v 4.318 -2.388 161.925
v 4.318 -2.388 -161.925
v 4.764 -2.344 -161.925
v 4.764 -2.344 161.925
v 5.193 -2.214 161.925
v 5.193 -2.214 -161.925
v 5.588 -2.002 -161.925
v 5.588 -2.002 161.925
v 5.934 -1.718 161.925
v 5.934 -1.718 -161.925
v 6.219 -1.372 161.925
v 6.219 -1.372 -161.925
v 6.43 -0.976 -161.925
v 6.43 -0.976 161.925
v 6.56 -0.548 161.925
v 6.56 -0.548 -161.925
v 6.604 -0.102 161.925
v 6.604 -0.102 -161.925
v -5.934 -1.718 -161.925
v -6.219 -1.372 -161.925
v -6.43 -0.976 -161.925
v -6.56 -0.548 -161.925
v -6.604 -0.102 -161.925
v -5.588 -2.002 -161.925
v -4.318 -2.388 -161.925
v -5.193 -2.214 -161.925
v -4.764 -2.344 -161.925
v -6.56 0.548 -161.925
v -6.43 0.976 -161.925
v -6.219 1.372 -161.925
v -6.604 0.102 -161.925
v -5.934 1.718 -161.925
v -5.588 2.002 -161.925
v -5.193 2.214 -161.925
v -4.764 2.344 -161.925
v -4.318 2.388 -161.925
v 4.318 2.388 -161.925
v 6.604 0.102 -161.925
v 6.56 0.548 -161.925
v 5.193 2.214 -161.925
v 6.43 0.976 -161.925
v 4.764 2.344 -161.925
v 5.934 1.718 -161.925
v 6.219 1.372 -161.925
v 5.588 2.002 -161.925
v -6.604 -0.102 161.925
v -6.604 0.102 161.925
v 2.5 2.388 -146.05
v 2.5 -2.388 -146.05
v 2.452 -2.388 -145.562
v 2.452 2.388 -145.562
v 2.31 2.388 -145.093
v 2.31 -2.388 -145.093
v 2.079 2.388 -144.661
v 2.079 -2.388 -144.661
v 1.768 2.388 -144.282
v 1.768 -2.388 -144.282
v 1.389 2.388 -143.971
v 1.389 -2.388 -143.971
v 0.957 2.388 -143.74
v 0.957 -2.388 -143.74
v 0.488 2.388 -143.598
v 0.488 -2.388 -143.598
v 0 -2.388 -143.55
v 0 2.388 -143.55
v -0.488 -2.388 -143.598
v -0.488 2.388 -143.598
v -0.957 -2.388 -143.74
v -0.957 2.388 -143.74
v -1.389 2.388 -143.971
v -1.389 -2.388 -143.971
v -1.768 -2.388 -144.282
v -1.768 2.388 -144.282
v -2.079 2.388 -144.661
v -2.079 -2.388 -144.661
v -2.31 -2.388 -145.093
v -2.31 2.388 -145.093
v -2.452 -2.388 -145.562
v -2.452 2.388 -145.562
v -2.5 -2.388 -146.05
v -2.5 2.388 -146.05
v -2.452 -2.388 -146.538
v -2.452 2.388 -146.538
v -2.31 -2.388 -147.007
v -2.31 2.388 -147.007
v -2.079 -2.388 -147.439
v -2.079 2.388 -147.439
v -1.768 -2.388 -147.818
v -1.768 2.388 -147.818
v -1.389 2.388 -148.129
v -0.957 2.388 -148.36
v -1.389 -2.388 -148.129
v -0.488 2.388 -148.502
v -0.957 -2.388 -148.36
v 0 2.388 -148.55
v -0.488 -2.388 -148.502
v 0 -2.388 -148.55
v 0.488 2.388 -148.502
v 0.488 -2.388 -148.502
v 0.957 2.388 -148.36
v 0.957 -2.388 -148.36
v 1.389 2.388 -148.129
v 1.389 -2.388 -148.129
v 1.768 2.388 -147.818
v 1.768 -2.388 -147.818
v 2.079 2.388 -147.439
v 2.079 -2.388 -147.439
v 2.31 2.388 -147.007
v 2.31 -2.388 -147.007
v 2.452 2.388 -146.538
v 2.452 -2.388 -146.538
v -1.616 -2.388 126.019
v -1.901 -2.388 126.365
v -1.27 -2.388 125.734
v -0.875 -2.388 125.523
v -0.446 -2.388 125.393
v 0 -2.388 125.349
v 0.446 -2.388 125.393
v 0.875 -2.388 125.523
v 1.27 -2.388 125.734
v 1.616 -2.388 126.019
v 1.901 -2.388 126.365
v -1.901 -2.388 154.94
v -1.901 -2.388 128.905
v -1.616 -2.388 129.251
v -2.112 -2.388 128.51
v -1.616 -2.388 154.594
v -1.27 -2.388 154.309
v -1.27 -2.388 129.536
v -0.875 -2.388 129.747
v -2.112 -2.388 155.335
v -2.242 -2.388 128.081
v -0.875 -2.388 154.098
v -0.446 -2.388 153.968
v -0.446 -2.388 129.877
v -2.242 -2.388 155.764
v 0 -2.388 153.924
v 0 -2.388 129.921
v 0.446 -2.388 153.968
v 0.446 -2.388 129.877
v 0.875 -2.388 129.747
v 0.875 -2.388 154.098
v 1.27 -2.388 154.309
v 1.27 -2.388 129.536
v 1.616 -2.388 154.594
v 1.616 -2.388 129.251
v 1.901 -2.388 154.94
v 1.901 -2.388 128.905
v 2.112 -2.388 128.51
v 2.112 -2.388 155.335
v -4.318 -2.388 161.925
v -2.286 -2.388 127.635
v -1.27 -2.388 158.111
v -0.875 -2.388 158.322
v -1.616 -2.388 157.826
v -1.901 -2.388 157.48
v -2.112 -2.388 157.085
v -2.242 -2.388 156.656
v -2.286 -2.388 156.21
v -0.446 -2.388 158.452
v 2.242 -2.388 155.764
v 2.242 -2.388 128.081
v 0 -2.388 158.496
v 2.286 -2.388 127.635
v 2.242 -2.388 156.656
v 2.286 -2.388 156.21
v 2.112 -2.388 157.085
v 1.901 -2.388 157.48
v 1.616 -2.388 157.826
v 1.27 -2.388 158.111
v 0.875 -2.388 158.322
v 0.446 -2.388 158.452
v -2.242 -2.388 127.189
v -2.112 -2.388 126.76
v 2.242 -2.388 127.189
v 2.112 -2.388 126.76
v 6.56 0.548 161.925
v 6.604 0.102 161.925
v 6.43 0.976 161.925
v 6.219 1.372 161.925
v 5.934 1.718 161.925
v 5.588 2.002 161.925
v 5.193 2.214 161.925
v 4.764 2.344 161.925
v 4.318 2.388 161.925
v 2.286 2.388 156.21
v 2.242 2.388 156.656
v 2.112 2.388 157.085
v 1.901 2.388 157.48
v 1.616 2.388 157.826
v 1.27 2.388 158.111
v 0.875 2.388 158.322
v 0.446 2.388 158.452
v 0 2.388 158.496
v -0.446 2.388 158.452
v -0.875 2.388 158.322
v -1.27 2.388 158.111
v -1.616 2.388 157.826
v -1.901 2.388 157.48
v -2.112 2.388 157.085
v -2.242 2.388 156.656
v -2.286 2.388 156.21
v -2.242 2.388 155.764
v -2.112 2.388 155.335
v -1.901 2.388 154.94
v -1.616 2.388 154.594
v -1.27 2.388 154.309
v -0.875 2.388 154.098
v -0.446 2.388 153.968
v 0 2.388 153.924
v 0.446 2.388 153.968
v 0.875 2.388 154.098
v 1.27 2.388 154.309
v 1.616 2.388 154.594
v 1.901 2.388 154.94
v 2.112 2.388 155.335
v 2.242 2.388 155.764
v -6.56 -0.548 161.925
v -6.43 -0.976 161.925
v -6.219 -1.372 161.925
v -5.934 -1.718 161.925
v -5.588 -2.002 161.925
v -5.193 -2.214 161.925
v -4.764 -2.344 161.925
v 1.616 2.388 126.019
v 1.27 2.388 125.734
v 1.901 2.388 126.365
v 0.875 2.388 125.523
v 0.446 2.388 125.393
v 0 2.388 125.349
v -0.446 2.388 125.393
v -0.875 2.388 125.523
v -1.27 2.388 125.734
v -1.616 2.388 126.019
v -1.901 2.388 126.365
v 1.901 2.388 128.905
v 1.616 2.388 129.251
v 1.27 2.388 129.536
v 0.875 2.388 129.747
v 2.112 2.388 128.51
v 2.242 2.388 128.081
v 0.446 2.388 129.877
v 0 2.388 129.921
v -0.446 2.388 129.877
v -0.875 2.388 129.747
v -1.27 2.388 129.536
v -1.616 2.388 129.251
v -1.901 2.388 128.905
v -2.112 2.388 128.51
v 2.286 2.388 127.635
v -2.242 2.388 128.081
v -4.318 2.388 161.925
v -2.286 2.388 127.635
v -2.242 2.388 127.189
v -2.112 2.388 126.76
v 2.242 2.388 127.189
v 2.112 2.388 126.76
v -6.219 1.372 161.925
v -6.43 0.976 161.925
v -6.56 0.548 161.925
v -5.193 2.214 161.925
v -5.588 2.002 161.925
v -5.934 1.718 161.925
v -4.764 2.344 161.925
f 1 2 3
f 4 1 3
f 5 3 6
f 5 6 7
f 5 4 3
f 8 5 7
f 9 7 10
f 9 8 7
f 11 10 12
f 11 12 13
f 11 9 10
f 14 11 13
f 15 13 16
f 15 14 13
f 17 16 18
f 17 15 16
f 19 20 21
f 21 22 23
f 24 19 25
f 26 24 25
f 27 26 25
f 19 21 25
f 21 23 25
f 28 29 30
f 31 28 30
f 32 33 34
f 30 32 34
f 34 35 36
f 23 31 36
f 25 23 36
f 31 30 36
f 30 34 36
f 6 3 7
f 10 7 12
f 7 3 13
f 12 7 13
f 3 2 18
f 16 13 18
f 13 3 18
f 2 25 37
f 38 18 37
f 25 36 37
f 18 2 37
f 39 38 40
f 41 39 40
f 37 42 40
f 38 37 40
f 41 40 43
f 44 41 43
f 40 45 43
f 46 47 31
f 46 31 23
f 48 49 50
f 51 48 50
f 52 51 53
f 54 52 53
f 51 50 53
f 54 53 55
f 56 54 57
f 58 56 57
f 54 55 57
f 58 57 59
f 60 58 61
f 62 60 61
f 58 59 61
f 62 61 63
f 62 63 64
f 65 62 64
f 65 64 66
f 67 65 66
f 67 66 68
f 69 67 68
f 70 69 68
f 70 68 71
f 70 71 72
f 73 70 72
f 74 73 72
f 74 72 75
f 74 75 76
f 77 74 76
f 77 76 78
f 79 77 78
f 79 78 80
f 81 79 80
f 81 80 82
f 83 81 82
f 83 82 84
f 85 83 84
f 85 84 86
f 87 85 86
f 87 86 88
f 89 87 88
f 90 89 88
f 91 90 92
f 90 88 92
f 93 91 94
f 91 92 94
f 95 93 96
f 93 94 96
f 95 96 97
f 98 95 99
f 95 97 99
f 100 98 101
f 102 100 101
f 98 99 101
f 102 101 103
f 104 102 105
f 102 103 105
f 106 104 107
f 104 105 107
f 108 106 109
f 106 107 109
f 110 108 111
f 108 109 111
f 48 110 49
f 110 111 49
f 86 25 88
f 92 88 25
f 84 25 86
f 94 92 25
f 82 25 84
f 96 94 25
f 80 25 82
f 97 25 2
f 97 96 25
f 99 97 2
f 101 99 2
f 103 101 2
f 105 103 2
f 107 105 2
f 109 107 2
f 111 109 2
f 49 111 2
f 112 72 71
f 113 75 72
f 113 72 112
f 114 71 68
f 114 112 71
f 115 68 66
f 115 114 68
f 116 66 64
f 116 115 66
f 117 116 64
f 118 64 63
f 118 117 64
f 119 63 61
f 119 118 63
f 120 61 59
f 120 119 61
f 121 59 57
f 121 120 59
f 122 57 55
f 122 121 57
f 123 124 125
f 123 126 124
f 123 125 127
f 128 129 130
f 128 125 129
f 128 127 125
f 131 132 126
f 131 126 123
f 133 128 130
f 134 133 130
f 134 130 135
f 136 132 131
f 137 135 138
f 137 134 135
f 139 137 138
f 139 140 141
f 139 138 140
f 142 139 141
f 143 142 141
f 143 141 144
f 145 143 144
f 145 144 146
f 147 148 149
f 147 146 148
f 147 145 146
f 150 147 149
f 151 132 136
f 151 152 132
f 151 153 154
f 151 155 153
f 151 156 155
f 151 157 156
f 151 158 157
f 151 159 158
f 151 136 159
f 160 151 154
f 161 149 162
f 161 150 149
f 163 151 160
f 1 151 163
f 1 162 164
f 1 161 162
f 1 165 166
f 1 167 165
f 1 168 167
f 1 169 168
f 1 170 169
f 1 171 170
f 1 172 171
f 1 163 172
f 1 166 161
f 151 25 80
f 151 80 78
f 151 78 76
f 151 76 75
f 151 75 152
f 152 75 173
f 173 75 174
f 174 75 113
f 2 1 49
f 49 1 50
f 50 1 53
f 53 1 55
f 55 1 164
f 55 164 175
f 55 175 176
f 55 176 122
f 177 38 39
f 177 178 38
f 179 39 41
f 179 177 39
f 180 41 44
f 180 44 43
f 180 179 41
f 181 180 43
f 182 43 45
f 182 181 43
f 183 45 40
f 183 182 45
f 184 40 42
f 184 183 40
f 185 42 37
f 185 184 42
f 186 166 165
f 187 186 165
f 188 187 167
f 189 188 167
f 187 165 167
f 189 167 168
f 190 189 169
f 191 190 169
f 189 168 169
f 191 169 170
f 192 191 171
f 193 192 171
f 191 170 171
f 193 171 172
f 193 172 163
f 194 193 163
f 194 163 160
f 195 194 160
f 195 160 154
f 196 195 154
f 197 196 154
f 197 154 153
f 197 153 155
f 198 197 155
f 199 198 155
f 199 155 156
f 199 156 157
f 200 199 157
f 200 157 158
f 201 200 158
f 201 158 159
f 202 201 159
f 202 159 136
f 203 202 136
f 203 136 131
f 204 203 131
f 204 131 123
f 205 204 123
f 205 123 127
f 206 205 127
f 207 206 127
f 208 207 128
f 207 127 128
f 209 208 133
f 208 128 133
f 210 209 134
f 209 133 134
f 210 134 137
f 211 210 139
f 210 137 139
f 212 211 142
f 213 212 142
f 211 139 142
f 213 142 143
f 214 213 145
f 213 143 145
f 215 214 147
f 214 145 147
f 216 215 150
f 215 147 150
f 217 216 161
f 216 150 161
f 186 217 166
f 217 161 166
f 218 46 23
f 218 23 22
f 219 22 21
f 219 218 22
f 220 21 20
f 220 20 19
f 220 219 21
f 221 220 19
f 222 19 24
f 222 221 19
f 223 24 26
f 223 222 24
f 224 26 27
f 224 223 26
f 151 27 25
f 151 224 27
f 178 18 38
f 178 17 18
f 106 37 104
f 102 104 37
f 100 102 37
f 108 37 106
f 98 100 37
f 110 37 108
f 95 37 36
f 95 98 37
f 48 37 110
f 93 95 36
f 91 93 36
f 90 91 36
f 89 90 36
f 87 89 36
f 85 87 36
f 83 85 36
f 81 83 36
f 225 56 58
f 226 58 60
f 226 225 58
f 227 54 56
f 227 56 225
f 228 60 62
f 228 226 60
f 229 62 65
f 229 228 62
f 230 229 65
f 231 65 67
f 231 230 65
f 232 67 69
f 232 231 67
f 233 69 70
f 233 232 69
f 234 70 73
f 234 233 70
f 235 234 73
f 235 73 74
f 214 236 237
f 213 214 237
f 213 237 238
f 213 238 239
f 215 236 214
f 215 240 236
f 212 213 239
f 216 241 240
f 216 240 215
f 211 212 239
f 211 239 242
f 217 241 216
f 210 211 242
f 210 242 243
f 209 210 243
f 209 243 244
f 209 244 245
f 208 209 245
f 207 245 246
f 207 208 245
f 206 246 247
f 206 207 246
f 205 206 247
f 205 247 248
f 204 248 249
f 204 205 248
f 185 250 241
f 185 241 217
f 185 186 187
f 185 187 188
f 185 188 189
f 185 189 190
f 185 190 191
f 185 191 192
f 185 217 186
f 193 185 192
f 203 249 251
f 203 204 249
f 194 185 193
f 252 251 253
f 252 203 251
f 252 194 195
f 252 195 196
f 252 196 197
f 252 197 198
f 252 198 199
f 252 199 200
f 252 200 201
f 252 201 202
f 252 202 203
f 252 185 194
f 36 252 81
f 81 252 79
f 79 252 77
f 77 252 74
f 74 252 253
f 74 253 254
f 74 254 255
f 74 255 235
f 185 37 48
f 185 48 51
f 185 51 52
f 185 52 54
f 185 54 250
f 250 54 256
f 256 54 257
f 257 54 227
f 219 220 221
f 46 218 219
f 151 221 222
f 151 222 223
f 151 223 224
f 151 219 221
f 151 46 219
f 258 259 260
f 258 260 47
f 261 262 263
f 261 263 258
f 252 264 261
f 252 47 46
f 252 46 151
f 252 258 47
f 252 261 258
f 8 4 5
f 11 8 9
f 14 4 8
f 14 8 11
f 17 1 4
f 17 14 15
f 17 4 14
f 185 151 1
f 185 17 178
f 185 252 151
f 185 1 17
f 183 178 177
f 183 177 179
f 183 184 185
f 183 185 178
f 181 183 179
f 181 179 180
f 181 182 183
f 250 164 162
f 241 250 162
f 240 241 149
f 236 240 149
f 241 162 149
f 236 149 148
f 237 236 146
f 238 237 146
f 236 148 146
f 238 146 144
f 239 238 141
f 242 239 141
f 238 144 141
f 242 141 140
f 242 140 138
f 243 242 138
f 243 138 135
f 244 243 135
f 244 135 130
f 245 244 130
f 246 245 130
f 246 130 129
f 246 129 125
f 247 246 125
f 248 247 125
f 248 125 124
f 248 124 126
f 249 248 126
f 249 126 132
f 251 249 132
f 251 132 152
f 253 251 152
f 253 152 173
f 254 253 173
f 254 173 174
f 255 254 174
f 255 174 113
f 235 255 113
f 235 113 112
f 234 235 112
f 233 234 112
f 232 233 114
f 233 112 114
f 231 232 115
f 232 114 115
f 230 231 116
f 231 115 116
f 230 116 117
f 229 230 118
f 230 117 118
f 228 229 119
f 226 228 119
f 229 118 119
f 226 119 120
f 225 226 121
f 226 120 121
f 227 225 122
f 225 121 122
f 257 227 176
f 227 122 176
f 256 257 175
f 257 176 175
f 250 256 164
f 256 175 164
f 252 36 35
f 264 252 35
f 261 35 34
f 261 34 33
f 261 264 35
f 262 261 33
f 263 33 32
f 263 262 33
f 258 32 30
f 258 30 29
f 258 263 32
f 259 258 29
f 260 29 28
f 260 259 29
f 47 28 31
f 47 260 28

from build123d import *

# Parameters (mm, degrees)
F1_DEPTH = 161.925
F2_R     = 2.286
F3_DEPTH = 25.4
F4_R     = 2.5
F5_DEPTH = 25.4


with BuildPart() as f1:
    # F0 (on Top) → F1 (new body, symmetric)
    with BuildSketch(Plane.XY):
        with BuildLine():
            Line((4.318, 2.3876), (-4.318, 2.3876))
            ThreePointArc((-4.318, 2.3876), (-5.9344461018, 1.7180461018), (-6.604, 0.1016))
            Line((-6.604, 0.1016), (-6.604, -0.1016))
            ThreePointArc((-6.604, -0.1016), (-5.9344461018, -1.7180461018), (-4.318, -2.3876))
            Line((-4.318, -2.3876), (4.318, -2.3876))
            ThreePointArc((4.318, -2.3876), (5.9344461018, -1.7180461018), (6.604, -0.1016))
            Line((6.604, -0.1016), (6.604, 0.1016))
            ThreePointArc((6.604, 0.1016), (5.9344461018, 1.7180461018), (4.318, 2.3876))
        make_face()
    extrude(amount=F1_DEPTH, both=True)

    # F2 (on face) → F3 (cut)
    with BuildSketch(Plane.XZ.offset(2.3876)):
        with Locations((0, 156.21)):
            Circle(F2_R)
        with Locations((0, 127.635)):
            Circle(F2_R)
    extrude(amount=-F3_DEPTH, mode=Mode.SUBTRACT)

    # F4 (on face) → F5 (cut)
    with BuildSketch(Plane.XZ.offset(2.3876)):
        with Locations((0, -146.05)):
            Circle(F4_R)
    extrude(amount=-F5_DEPTH, mode=Mode.SUBTRACT)


solid = f1.part
